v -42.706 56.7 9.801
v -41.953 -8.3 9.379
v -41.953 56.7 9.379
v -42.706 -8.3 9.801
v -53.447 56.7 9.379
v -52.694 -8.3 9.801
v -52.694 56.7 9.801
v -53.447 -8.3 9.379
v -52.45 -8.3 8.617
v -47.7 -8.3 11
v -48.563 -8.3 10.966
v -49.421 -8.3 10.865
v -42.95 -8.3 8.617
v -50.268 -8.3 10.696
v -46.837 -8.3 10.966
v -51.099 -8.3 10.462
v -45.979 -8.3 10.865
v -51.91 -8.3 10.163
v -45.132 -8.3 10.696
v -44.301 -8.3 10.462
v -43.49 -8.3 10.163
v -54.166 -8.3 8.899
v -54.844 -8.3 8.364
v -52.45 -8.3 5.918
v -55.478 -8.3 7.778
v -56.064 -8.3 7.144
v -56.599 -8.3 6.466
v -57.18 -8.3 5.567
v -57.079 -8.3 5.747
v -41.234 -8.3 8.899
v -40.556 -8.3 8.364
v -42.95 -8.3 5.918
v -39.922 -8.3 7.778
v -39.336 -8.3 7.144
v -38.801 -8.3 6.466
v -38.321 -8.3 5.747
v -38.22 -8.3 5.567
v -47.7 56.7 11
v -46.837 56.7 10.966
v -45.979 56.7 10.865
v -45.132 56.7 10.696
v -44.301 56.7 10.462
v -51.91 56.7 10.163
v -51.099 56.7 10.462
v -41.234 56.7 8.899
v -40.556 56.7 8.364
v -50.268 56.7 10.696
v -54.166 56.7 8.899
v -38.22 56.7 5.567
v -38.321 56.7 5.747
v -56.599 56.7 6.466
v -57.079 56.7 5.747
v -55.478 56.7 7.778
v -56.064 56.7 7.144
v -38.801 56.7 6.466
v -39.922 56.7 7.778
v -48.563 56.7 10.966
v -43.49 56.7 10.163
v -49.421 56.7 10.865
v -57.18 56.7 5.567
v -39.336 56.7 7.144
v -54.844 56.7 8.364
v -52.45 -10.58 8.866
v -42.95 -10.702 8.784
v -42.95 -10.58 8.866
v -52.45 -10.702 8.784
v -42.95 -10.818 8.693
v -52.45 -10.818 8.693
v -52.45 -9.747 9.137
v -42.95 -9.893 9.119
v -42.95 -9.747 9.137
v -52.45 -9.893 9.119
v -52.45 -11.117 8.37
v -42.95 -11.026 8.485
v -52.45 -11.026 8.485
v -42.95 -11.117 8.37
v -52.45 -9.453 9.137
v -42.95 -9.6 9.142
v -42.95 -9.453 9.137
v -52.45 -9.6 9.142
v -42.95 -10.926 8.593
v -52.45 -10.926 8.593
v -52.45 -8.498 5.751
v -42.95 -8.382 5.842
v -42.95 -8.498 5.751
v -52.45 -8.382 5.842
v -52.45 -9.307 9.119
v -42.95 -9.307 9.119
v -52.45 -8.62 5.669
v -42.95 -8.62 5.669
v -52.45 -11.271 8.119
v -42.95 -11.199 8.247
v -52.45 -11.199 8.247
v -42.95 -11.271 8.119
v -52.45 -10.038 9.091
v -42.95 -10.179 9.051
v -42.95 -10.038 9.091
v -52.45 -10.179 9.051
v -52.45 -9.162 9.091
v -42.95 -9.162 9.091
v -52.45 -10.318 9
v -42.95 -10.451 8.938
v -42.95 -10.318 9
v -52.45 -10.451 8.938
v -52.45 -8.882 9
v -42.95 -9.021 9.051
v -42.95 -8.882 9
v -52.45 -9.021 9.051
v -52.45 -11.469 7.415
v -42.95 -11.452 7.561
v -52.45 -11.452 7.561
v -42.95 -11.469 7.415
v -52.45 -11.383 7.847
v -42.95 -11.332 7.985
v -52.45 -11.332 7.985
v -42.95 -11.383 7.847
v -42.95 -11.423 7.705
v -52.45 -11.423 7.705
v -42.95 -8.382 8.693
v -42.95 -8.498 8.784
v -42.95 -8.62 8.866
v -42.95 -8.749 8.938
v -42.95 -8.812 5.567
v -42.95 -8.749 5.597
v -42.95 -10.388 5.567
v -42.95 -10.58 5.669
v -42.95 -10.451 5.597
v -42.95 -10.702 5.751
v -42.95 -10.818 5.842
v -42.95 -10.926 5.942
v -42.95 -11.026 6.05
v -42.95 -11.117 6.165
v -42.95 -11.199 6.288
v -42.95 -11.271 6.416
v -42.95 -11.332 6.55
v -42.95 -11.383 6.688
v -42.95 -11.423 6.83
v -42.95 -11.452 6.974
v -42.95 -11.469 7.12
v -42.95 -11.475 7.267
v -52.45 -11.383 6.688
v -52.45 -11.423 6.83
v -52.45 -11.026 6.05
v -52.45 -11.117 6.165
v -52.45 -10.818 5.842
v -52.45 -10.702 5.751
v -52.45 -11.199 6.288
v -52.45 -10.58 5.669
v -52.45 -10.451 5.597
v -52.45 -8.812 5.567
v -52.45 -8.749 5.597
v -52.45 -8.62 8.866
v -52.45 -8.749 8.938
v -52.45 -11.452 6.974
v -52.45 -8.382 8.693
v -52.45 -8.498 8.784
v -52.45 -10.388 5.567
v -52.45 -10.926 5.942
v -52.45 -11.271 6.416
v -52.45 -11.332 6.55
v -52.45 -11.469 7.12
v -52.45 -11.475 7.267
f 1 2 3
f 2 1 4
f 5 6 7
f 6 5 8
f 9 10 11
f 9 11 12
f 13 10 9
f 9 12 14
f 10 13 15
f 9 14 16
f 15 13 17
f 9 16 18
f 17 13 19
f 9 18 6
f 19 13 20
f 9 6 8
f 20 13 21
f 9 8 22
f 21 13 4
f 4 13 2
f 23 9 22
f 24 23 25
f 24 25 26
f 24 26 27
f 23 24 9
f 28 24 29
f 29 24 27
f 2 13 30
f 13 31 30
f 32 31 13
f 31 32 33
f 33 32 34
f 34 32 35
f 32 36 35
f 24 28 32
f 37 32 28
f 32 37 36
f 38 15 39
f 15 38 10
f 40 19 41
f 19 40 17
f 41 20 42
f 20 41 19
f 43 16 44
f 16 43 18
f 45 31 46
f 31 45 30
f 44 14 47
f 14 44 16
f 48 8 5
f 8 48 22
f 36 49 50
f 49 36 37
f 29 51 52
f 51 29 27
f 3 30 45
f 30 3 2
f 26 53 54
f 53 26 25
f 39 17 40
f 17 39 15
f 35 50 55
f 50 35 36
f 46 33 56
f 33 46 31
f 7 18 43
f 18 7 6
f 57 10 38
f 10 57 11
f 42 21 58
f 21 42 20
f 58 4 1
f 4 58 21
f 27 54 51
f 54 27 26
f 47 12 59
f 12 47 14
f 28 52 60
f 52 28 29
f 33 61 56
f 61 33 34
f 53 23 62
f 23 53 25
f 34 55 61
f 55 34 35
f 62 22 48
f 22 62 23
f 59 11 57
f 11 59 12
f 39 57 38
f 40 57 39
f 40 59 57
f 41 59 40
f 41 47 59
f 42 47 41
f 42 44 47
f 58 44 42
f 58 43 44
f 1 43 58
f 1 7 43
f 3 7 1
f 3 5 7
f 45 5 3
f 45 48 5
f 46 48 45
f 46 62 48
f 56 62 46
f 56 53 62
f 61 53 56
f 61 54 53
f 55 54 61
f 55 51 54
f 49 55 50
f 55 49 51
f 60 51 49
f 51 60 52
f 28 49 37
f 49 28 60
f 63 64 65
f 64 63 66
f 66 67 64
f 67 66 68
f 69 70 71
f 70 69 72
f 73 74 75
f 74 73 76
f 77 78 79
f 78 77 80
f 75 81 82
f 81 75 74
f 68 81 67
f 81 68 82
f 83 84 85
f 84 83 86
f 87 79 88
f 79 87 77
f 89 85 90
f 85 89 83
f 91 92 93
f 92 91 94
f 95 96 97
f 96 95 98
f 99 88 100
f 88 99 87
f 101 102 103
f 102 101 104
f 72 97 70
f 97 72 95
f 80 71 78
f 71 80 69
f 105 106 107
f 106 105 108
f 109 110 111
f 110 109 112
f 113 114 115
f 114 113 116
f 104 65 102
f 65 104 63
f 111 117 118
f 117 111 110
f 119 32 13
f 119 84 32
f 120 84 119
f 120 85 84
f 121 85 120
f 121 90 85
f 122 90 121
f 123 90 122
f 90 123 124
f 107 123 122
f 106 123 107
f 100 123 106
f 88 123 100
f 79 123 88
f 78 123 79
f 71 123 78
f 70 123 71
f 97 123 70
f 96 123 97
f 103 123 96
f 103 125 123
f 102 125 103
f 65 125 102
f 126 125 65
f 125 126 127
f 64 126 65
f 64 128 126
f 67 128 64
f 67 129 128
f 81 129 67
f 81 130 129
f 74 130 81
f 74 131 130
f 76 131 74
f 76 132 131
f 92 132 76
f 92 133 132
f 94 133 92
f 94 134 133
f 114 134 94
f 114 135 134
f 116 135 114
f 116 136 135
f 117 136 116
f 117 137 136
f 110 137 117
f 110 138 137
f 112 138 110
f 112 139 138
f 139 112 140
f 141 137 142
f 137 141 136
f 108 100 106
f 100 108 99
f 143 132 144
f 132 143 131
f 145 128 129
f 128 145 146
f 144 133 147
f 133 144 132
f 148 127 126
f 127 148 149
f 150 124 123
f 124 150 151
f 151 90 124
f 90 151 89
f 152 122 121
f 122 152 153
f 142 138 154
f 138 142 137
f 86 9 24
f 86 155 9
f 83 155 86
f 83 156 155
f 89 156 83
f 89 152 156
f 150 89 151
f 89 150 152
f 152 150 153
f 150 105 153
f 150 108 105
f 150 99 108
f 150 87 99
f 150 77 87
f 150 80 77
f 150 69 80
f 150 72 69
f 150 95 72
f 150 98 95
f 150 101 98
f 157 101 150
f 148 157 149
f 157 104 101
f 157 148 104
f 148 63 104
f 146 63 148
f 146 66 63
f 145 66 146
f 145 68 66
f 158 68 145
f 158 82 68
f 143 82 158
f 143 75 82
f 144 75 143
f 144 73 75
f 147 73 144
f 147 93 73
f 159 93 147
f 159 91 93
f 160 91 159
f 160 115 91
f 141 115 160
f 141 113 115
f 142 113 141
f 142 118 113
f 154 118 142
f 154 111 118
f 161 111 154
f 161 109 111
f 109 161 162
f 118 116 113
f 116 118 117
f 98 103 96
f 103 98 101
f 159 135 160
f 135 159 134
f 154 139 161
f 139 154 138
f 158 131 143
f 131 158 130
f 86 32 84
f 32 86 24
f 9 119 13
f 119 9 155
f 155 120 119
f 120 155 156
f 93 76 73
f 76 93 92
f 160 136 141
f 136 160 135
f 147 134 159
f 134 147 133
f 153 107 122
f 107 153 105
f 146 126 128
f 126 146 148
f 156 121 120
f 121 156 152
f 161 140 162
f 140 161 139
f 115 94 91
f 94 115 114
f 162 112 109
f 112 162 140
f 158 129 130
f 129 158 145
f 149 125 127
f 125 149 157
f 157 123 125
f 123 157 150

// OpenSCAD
tongue_length = 65;

rotate(180, v=[1,0,0]) {
	translate([0, -54.2, 20]) {
		difference() {
			translate([-47.7, 30, -20])
			rotate(90, v=[1,0,0])
			color("grey")
			cylinder(d=22, h=tongue_length, center=true, $fn=80);

			translate([-47.7, 30, -13.567])
			color("green")
			cube([24, 135, 24], center=true);
		}
	}
	translate([0, -15.2+(tongue_length/2), 0.6325]) // 0
	difference() {
		translate([-47.7, -7.7, -7.9])
		rotate(90, v=[0,1,0])
		cylinder(h=9.5, d=3.75, center=true, $fn=80);	
		
		translate([-47.7, -7.7, 5.8])
		color("blue")
		cube([26, 5, 24], center=true);
	
	}
}
